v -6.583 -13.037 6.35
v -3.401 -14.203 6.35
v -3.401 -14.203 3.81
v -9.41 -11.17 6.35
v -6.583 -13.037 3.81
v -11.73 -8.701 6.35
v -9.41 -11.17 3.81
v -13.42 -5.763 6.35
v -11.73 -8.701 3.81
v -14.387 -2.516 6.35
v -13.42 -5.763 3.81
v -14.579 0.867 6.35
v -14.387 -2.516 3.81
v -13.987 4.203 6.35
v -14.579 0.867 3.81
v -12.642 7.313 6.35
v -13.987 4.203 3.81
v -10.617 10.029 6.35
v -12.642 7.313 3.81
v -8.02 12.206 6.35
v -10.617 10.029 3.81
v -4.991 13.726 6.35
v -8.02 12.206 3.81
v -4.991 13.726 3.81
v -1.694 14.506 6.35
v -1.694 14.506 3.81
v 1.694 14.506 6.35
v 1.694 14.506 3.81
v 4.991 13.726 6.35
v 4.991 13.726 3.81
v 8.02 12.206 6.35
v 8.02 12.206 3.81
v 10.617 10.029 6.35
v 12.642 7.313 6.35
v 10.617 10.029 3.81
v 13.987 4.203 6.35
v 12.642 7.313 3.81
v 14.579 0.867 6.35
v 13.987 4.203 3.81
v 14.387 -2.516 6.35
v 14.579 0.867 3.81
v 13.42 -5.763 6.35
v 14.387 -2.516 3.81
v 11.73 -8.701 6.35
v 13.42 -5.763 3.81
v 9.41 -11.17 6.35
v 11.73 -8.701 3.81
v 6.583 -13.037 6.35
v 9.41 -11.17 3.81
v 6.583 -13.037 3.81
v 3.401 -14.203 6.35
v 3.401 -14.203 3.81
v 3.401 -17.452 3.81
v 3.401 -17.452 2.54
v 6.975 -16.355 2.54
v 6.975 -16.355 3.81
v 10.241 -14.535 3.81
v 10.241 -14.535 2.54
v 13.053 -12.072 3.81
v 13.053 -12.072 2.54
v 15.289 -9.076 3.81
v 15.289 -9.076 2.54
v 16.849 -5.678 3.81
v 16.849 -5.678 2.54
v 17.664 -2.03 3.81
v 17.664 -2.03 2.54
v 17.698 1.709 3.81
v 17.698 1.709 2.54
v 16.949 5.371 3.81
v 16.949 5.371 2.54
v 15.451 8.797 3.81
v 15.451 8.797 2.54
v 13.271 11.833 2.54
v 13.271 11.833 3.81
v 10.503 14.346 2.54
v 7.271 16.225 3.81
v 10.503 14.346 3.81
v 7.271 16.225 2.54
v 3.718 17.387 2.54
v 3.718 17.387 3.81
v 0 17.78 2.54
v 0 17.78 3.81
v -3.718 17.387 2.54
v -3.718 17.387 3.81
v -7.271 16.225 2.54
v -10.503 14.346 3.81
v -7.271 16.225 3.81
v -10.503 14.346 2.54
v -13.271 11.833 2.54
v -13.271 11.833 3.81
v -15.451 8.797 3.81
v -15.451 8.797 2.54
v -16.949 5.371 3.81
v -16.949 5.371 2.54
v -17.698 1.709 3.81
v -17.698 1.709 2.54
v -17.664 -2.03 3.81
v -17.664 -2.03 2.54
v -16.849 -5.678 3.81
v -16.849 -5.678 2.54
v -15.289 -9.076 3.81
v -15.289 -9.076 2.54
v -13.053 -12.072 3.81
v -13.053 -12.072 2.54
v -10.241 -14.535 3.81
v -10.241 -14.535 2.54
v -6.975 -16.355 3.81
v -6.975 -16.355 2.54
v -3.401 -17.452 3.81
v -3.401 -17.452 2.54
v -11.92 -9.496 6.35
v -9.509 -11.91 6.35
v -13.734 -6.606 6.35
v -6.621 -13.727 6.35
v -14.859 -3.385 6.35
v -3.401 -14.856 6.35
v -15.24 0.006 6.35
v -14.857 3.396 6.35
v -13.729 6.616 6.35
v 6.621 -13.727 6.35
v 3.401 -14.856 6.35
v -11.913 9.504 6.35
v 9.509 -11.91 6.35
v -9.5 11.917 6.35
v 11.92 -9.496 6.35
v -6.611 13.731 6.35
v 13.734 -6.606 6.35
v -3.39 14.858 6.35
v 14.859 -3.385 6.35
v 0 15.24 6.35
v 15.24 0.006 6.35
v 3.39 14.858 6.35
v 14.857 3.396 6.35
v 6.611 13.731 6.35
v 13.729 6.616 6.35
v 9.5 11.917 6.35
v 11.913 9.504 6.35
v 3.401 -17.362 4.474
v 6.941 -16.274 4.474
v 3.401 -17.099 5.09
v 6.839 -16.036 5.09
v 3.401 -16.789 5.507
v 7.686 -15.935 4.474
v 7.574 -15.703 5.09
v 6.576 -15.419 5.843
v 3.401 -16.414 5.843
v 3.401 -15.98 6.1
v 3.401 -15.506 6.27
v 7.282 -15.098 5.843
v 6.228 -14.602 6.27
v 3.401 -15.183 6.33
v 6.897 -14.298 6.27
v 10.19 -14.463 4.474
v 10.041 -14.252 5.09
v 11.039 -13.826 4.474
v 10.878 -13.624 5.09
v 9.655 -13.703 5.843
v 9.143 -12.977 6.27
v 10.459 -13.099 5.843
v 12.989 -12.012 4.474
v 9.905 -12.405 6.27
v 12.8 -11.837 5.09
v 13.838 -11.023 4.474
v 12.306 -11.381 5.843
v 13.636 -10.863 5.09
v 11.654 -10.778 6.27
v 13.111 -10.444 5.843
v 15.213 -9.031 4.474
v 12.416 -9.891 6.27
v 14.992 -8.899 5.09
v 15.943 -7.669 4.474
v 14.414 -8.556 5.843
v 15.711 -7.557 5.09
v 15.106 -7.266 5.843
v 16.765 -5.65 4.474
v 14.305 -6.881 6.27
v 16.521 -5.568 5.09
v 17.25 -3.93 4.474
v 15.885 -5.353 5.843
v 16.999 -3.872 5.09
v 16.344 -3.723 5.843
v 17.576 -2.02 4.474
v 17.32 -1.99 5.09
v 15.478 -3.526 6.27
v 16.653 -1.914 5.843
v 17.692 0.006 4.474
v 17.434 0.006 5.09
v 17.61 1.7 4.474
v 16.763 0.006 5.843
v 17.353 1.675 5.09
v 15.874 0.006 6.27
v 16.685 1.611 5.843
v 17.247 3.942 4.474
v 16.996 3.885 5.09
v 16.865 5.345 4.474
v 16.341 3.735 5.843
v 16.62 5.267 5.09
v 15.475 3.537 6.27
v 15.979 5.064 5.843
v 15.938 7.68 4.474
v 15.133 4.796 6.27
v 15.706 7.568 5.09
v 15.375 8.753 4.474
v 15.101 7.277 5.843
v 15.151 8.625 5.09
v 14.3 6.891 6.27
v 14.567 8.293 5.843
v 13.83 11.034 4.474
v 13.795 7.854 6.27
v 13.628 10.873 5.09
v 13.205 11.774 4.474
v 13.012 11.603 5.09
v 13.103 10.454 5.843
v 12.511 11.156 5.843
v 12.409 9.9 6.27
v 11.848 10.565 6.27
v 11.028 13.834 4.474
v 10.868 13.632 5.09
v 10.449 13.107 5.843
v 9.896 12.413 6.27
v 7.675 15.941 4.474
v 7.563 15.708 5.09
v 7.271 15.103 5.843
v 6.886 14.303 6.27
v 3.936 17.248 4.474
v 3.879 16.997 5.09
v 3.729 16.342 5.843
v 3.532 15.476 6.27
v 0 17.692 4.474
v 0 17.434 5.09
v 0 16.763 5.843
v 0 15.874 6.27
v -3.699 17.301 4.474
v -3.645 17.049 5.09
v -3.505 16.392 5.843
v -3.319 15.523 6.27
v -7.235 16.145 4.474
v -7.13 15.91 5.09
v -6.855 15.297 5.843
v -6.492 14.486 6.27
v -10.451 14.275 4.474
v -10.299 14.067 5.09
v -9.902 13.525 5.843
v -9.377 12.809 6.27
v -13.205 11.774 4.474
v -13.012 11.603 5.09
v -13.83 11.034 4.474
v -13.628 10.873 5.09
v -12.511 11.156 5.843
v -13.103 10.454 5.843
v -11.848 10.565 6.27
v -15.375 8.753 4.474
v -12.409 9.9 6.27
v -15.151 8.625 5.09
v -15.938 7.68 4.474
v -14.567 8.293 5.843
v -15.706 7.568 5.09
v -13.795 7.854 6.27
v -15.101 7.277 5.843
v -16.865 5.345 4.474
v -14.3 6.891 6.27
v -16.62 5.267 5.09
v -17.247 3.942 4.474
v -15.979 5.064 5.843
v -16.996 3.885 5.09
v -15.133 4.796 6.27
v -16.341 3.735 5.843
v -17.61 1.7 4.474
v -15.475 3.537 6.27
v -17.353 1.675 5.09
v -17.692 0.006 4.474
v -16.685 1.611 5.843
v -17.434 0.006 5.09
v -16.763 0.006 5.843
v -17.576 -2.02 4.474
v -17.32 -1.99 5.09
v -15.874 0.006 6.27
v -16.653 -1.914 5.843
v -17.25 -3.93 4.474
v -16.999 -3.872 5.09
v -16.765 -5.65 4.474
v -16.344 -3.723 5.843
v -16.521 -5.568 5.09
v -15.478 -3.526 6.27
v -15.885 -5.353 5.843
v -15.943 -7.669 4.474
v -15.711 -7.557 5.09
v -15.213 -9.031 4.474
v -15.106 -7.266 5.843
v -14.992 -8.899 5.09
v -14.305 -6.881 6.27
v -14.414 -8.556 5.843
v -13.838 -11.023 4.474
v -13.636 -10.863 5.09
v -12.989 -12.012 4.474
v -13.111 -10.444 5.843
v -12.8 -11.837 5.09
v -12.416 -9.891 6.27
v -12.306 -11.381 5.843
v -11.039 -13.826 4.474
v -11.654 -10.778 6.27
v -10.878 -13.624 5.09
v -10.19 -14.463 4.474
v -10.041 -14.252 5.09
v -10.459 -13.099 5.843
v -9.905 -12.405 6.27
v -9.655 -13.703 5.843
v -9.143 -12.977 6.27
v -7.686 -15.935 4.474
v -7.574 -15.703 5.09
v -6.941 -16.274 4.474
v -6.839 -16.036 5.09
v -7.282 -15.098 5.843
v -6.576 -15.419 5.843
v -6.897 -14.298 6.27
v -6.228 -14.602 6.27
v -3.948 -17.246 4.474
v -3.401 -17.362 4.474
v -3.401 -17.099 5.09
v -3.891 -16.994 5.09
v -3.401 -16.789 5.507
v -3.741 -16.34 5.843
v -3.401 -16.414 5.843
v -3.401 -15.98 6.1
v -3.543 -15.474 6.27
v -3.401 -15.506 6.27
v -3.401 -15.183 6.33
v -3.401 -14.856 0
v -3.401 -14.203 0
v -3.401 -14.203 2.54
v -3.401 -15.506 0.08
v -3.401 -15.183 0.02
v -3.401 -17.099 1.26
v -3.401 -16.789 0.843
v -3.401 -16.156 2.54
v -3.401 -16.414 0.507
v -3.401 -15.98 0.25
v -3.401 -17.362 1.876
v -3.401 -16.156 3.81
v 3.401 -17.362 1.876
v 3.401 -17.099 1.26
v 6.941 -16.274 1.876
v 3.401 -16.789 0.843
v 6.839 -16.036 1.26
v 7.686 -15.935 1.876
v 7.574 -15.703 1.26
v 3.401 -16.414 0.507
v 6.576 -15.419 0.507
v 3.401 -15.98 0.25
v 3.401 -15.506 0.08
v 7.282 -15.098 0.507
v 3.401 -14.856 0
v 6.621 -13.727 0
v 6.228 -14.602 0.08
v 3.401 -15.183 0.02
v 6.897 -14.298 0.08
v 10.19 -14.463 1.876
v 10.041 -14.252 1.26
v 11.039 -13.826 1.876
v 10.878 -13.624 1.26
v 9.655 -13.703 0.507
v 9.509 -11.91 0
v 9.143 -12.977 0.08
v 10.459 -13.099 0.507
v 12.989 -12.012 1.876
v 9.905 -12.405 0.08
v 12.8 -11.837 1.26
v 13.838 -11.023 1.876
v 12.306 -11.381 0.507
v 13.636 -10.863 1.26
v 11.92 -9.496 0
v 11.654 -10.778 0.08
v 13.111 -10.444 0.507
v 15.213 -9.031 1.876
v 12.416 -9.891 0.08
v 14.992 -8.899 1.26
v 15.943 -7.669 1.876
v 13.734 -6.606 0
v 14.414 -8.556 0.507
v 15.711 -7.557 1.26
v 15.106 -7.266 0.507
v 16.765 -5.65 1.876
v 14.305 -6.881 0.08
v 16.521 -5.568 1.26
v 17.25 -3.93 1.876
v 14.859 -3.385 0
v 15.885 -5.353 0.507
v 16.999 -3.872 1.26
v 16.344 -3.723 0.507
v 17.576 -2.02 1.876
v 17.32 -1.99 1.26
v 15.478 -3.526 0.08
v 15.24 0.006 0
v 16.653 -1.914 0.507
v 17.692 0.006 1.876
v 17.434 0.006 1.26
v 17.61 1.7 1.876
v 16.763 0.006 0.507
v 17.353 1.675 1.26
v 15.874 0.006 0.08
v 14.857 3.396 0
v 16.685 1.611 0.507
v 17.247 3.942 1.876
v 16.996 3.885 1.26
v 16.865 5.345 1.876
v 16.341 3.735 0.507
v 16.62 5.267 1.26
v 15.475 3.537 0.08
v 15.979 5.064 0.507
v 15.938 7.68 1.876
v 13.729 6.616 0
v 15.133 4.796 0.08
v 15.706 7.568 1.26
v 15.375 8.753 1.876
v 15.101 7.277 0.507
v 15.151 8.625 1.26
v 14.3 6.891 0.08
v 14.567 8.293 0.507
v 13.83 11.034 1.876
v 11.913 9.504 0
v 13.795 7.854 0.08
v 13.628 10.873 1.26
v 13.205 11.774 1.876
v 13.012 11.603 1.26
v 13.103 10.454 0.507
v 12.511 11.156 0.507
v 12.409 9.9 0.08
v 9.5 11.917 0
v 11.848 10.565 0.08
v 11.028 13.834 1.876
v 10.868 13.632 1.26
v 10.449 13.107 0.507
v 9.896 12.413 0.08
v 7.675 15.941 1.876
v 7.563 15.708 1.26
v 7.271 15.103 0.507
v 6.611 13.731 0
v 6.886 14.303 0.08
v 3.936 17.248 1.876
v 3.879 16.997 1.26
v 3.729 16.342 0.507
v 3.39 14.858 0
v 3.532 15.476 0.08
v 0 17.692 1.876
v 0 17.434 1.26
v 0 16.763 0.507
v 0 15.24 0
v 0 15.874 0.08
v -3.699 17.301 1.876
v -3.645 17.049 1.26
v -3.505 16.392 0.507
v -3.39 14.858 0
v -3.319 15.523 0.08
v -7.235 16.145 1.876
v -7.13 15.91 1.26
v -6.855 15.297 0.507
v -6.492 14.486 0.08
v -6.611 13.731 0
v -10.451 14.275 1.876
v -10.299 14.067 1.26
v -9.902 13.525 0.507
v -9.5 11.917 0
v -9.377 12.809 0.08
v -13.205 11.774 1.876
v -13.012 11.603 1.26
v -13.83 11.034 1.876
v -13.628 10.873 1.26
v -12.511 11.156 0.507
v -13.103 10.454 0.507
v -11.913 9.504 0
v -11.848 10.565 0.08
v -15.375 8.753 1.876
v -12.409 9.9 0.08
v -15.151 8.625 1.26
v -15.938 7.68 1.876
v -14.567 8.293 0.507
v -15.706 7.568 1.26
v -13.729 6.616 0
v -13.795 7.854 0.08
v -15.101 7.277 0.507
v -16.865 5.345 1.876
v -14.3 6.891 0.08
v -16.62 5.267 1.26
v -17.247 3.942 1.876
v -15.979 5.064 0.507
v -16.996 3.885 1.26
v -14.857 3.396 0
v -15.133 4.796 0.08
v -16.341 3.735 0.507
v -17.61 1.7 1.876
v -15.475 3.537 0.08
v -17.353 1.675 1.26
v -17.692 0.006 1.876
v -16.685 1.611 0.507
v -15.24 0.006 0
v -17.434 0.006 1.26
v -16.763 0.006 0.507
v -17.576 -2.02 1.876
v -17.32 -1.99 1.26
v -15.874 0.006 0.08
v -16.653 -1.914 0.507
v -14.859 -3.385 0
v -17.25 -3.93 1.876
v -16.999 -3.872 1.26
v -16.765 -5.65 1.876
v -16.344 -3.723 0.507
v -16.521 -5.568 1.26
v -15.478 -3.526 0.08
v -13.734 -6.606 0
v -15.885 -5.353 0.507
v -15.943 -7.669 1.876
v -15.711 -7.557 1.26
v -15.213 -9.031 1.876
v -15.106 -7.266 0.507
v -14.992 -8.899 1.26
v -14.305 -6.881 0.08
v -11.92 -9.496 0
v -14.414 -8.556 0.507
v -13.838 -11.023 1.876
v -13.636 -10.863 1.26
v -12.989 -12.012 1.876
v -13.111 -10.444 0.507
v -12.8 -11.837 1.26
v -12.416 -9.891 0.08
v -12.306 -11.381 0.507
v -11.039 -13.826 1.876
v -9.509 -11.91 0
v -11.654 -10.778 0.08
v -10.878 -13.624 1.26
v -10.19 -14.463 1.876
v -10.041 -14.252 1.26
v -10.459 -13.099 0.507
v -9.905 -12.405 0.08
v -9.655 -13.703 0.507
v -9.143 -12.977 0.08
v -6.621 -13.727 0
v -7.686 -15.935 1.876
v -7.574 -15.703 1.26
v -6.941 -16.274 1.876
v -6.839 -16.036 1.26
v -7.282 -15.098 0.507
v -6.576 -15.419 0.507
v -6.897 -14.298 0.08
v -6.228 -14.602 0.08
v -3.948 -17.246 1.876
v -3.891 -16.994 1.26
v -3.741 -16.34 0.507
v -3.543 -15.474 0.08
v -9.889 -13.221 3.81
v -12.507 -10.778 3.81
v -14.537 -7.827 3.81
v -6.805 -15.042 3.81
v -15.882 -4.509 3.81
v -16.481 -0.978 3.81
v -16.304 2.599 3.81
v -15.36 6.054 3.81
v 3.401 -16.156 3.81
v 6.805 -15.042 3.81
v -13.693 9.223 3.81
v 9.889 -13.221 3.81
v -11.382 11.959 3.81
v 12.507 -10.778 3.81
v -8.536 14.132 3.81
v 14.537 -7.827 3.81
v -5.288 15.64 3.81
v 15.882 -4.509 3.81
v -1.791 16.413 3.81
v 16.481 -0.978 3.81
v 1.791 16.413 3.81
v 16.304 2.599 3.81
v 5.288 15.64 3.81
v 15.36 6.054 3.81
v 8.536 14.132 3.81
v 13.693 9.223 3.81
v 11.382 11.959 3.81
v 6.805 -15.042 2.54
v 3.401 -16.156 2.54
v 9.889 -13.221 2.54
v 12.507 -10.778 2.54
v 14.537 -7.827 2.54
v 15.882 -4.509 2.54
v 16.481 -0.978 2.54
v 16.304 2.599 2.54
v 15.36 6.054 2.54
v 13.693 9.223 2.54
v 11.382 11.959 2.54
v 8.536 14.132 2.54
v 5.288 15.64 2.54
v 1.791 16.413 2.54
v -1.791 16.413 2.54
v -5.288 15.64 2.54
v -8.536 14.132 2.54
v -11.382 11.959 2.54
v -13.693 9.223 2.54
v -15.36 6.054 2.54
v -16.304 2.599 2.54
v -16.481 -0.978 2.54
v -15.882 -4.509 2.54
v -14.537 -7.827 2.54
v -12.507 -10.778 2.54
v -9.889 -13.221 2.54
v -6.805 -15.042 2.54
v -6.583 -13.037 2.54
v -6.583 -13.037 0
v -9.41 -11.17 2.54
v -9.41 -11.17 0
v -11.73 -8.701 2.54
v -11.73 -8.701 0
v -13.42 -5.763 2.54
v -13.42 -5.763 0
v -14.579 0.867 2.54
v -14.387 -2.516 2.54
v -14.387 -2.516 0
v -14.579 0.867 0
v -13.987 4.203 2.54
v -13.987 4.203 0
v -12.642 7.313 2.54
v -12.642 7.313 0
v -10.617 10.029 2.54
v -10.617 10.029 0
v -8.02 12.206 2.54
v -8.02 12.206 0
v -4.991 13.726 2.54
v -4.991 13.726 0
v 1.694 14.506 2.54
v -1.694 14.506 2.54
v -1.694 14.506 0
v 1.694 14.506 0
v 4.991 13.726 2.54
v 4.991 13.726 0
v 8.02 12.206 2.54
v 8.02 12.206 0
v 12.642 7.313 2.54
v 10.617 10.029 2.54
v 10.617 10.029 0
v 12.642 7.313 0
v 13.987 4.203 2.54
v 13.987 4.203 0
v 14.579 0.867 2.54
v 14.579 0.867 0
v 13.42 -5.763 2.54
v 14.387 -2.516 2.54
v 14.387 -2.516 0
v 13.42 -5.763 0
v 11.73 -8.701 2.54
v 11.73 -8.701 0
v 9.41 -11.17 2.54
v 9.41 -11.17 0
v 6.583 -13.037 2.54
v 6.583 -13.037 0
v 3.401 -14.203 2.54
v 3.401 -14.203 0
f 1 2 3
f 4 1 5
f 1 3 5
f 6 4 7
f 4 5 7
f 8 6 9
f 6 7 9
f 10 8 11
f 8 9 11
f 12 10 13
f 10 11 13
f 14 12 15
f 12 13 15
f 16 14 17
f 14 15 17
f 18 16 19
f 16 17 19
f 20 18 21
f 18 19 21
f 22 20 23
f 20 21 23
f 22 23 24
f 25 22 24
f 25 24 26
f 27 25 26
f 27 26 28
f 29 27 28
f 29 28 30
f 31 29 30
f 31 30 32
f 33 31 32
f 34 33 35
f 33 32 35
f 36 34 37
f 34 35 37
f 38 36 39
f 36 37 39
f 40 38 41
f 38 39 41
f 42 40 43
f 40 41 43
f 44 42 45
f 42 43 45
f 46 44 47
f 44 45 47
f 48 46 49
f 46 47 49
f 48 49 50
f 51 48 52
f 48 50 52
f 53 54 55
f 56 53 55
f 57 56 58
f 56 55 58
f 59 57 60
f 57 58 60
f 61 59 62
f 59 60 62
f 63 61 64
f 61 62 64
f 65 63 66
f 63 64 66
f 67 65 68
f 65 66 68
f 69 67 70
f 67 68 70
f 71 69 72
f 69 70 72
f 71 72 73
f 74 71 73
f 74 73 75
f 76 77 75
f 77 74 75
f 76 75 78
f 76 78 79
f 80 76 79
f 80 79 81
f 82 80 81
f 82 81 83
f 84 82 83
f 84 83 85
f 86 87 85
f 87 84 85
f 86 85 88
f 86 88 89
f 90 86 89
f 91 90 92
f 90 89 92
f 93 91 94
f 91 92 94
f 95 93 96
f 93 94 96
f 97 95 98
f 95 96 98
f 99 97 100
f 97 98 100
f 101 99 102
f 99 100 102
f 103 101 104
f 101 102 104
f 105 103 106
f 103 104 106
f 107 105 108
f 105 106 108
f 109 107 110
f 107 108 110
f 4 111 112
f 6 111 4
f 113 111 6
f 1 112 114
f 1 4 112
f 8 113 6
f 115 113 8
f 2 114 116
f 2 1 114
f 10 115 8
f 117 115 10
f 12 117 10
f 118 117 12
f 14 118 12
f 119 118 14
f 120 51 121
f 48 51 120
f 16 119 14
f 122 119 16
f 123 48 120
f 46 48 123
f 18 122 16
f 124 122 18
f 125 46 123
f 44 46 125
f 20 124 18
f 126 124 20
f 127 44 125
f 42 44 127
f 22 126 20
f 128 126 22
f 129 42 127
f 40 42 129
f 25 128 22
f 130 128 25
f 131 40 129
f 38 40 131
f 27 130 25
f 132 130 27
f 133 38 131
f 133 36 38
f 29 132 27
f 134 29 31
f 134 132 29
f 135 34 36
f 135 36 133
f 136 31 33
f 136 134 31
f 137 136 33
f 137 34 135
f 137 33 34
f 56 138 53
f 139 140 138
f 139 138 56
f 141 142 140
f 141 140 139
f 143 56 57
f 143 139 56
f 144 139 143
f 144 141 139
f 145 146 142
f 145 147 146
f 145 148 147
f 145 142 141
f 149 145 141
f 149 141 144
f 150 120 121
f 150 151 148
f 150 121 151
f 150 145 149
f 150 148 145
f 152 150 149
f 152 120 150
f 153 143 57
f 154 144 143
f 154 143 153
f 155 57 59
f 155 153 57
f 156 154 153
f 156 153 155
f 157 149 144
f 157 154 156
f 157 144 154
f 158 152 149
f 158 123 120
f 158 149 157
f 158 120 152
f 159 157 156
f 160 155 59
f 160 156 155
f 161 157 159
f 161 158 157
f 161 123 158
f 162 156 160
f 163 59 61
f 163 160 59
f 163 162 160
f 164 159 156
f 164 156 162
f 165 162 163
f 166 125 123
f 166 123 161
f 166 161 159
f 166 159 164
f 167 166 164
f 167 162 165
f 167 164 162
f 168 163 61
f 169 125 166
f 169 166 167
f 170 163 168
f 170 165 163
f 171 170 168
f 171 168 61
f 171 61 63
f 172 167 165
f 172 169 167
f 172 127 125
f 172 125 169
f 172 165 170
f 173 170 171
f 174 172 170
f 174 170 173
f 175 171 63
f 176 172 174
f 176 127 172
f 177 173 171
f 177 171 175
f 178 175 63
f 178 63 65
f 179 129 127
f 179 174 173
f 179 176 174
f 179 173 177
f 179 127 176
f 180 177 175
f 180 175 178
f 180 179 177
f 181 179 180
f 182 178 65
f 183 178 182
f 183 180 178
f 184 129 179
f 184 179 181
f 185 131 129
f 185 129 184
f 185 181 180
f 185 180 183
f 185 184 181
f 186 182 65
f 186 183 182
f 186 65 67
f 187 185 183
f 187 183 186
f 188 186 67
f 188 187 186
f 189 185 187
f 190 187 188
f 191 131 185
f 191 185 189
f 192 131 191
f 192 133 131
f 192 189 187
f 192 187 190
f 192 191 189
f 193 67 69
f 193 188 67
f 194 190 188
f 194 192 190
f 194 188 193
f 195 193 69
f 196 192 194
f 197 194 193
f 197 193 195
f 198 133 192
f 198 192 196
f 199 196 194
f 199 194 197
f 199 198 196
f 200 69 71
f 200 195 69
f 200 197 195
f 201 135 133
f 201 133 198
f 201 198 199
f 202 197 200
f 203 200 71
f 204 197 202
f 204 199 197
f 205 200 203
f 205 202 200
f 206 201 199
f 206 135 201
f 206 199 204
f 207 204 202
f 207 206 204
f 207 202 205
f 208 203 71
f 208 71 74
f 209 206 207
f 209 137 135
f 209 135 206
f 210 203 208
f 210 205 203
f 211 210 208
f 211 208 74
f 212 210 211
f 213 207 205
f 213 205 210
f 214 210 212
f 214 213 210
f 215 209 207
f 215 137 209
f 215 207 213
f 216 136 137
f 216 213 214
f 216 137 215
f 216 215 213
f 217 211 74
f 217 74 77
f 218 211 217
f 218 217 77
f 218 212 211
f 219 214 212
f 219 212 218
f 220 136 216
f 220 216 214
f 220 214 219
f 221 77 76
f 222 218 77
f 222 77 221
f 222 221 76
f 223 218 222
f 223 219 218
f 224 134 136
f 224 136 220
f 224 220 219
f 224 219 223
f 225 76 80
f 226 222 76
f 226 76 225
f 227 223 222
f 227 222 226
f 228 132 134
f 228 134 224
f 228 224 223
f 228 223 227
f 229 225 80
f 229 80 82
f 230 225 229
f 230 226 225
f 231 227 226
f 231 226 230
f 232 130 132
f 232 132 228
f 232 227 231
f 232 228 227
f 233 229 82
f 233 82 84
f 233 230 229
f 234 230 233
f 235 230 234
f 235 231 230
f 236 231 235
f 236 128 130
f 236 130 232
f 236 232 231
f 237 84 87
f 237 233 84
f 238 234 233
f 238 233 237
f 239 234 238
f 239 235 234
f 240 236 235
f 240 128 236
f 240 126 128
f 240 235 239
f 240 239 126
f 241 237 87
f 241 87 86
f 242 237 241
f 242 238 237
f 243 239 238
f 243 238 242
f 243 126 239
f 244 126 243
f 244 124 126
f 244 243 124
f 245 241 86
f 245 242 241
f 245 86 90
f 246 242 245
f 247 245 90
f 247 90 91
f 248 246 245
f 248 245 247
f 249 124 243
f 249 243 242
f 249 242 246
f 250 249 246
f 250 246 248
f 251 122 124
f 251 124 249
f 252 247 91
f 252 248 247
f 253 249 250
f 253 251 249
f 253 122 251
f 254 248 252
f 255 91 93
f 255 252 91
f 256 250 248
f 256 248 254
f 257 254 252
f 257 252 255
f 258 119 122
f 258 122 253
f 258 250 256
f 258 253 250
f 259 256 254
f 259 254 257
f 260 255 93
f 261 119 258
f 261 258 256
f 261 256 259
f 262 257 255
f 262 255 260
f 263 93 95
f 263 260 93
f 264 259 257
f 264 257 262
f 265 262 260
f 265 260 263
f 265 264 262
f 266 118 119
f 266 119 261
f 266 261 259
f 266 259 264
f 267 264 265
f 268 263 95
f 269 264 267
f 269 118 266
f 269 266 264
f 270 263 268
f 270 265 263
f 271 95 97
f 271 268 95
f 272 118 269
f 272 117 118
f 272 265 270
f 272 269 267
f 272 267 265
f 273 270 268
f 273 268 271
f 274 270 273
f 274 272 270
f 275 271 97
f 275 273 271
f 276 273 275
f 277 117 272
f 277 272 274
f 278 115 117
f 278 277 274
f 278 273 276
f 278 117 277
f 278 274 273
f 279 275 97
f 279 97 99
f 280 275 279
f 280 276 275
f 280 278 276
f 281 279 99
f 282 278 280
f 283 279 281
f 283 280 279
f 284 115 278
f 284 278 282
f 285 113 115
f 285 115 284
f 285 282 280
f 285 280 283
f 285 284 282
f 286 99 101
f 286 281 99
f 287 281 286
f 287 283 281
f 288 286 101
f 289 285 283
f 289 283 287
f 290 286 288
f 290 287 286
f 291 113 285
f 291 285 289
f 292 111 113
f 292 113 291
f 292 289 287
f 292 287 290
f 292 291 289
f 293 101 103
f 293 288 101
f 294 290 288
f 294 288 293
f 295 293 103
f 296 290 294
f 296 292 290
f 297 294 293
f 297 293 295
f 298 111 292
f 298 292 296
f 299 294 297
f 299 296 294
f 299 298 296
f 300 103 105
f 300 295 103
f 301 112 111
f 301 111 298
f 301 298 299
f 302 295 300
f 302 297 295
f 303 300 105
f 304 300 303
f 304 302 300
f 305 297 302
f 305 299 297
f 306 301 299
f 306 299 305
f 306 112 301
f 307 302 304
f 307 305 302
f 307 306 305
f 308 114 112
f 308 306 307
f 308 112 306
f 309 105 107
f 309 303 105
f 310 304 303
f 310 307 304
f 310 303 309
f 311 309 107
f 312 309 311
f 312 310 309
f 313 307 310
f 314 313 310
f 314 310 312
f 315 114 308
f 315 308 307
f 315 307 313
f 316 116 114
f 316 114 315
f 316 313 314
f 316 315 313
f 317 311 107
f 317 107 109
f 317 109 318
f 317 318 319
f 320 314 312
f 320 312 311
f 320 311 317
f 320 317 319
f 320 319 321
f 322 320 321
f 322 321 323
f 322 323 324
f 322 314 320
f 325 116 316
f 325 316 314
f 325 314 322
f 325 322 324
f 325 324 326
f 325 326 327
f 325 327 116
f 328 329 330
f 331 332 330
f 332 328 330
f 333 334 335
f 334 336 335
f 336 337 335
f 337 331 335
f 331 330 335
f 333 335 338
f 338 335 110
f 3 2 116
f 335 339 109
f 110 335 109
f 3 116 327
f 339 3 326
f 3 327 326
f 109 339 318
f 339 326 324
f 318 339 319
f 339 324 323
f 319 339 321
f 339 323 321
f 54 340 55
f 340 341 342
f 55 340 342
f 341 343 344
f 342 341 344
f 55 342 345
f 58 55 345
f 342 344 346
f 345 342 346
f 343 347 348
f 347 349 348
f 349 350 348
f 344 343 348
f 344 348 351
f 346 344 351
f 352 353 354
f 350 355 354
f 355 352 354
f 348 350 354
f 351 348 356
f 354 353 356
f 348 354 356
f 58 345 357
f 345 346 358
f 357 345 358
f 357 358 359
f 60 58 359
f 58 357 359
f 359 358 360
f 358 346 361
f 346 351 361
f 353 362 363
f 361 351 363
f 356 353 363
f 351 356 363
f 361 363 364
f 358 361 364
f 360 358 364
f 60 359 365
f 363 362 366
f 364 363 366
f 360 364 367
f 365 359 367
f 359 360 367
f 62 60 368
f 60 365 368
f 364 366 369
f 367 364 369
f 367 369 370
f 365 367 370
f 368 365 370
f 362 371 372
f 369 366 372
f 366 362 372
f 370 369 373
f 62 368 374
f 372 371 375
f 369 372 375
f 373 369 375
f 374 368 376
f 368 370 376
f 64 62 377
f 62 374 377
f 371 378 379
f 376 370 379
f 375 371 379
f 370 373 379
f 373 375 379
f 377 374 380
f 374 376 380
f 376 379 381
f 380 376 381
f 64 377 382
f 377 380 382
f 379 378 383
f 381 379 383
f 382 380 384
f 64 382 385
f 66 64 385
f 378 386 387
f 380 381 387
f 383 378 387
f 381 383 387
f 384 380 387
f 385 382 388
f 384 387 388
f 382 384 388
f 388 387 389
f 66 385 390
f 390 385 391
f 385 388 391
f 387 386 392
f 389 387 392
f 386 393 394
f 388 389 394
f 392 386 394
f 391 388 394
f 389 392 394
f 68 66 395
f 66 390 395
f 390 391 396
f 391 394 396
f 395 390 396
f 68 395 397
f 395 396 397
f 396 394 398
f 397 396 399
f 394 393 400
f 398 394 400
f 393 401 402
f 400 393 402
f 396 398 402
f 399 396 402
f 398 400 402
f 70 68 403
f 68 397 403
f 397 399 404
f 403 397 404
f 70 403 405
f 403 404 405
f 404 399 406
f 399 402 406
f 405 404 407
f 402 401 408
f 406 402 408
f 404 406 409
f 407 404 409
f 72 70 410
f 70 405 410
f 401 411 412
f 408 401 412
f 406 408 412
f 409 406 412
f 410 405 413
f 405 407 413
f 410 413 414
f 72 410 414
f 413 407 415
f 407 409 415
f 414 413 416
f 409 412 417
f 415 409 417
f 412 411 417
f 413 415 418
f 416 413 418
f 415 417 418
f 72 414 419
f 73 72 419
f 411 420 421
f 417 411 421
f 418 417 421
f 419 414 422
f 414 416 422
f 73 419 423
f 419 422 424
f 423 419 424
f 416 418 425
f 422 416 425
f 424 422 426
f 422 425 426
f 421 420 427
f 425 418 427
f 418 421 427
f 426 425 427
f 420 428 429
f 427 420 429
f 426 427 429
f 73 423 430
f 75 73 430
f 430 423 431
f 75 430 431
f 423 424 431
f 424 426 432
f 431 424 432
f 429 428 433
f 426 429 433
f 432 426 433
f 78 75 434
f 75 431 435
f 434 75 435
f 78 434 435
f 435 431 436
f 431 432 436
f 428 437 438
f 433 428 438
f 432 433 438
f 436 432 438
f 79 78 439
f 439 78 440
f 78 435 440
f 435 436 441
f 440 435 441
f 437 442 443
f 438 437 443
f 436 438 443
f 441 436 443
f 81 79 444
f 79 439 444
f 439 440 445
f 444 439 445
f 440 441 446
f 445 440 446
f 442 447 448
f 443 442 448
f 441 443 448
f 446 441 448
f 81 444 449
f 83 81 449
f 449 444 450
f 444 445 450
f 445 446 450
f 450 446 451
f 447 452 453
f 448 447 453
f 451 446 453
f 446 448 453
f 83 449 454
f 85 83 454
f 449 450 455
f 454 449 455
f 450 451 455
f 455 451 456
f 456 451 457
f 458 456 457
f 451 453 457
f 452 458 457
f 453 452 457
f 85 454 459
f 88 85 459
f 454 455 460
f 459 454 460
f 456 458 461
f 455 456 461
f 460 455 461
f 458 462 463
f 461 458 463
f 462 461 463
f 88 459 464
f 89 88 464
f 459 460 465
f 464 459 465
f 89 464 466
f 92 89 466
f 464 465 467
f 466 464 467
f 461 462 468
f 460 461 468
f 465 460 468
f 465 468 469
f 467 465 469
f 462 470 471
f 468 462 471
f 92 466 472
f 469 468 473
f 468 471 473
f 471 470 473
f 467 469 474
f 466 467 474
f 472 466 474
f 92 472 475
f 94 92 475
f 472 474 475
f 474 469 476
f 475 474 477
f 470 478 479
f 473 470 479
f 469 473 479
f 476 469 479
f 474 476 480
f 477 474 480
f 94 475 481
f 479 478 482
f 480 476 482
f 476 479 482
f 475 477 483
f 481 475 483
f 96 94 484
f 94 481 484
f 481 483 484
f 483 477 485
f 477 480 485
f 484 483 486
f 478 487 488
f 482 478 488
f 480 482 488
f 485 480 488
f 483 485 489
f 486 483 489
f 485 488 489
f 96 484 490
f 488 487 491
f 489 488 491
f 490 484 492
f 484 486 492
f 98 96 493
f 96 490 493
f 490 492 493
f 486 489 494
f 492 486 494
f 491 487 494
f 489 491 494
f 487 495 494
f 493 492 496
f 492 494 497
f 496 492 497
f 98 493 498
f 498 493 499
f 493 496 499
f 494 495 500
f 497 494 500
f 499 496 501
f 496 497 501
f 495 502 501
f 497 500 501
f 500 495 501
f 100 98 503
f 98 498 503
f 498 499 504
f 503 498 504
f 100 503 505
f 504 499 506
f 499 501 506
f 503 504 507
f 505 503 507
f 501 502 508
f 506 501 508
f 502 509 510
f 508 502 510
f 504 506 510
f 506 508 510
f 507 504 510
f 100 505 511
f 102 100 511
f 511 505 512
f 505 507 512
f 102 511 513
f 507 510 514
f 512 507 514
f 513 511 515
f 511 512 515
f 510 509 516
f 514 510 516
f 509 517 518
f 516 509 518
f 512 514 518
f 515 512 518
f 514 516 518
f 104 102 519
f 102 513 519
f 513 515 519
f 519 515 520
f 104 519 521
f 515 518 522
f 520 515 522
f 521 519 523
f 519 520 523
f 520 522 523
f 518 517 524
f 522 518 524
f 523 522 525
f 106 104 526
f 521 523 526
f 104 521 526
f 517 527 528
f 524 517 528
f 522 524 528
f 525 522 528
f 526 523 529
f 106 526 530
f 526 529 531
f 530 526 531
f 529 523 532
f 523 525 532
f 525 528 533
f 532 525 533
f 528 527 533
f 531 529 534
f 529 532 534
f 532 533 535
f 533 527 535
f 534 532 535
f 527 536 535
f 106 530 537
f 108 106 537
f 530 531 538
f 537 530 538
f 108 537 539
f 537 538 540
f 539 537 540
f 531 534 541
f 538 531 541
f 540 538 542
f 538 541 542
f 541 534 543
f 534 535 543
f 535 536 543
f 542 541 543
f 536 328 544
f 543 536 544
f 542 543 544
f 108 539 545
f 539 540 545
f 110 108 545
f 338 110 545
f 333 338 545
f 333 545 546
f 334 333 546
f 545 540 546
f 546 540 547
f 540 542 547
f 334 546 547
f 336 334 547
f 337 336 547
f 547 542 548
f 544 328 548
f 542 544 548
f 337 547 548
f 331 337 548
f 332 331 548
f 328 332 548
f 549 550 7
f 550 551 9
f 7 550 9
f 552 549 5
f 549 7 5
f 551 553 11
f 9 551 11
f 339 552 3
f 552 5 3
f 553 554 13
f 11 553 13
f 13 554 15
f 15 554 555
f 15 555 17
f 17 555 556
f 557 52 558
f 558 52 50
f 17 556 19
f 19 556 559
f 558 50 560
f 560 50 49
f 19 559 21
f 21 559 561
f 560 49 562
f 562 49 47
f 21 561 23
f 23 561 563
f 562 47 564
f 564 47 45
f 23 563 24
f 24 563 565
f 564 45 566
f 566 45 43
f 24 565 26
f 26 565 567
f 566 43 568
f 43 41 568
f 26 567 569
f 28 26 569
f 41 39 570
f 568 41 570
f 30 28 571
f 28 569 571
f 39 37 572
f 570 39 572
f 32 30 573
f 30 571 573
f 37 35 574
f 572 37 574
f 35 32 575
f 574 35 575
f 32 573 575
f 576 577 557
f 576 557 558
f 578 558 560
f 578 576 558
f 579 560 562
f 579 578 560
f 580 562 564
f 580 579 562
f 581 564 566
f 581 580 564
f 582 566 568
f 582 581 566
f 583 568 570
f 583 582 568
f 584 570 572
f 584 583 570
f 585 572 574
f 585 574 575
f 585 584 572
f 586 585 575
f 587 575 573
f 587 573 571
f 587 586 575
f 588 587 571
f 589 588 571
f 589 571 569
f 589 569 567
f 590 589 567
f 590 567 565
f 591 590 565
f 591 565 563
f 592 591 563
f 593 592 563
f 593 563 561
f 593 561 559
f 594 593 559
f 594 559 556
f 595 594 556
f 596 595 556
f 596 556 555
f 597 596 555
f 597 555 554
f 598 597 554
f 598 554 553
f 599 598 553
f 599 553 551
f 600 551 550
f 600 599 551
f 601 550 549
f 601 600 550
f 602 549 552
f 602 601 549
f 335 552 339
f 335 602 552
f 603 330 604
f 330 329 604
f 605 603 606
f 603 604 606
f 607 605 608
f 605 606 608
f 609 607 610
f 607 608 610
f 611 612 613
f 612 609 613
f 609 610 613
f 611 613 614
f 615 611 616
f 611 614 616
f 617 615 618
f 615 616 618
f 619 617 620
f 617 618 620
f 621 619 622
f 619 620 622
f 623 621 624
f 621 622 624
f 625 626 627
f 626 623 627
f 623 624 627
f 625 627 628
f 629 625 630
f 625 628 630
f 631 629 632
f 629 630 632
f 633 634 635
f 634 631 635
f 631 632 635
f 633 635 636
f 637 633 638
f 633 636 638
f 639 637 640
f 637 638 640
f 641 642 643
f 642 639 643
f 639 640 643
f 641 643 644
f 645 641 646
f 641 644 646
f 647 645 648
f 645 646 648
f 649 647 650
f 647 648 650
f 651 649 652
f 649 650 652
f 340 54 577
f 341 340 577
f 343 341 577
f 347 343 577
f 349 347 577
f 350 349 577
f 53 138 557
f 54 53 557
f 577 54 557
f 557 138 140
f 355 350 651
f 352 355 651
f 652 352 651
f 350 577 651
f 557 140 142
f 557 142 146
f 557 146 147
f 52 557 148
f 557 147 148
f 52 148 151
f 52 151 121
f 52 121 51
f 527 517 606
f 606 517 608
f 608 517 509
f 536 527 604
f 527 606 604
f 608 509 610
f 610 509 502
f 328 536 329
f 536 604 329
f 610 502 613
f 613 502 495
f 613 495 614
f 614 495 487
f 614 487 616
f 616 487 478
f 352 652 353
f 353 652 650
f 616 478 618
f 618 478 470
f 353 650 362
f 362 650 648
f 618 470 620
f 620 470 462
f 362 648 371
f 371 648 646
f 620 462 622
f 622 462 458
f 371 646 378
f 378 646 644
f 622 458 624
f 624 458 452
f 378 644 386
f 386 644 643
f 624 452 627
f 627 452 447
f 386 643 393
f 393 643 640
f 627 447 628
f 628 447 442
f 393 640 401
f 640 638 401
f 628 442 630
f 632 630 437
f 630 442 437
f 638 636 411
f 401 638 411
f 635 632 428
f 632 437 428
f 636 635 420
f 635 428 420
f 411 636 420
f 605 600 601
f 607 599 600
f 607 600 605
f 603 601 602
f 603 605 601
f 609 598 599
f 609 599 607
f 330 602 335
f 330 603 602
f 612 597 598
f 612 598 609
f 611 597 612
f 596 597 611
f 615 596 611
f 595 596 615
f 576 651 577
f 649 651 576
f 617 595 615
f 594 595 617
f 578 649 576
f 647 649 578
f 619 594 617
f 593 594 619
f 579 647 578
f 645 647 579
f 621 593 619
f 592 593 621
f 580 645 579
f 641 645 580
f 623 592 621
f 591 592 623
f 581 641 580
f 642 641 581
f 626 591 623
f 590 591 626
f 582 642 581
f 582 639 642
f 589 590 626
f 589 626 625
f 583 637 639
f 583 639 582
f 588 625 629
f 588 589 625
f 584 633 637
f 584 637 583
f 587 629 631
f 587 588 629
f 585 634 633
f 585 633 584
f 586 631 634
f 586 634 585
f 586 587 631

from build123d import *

# Parameters (mm, degrees)
F0_R      = 17.78
F1_DEPTH  = 2.54
F2_R      = 17.78
F2_R_2    = 16.51
F3_DEPTH  = 1.27
F4_R      = 17.78
F5_DEPTH  = 2.54
F6_R      = 14.605
F7_DEPTH  = 50.8
F8_R      = 2.54
F10_DEPTH = 30.734


with BuildPart() as f1:
    # F0 (on Top) → F1 (new body)
    with BuildSketch(Plane.XY):
        Circle(F0_R)
    extrude(amount=F1_DEPTH)

    # F2 (on face) → F3 (join)
    with BuildSketch(Plane.XY.offset(2.54)):
        Circle(F2_R)
        Circle(F2_R_2, mode=Mode.SUBTRACT)
    extrude(amount=F3_DEPTH)

    # F4 (on face) → F5 (join)
    with BuildSketch(Plane.XY.offset(3.81)):
        Circle(F4_R)
    extrude(amount=F5_DEPTH)

    # F6 (on face) → F7 (cut)
    with BuildSketch(Plane(origin=(0, 0, 0), x_dir=(1, 0, 0), z_dir=(0, 0, -1))):
        Circle(F6_R)
    extrude(amount=-F7_DEPTH, mode=Mode.SUBTRACT)

    # F8
    f8_edges = [f1.edges().sort_by_distance(p)[0] for p in [
        (-17.78, 0, 6.35),
        (-17.78, 0, 0),
    ]]
    fillet(f8_edges, radius=F8_R)

    # F9 (on face) → F10 (cut)
    with BuildSketch(Plane.XY.offset(6.35)):
        with BuildLine():
            Line((-3.4012887627, -22.1683233976), (3.4012887627, -22.1683233976))
            Line((3.4012887627, -22.1683233976), (3.4012887627, -14.855599441))
            ThreePointArc((3.4012887627, -14.855599441), (0, -15.24), (-3.4012887627, -14.855599441))
            Line((-3.4012887627, -14.855599441), (-3.4012887627, -22.1683233976))
        make_face()
        with BuildLine():
            ThreePointArc((-3.4012887627, -14.2034242263), (0, -14.605), (3.4012887627, -14.2034242263))
            Line((3.4012887627, -14.2034242263), (3.4012887627, -10.824047029))
            Line((3.4012887627, -10.824047029), (-3.4012887627, -10.824047029))
            Line((-3.4012887627, -10.824047029), (-3.4012887627, -14.2034242263))
        make_face()
        with BuildLine():
            ThreePointArc((-3.4012887627, -14.855599441), (0, -15.24), (3.4012887627, -14.855599441))
            Line((3.4012887627, -14.855599441), (3.4012887627, -14.2034242263))
            ThreePointArc((3.4012887627, -14.2034242263), (0, -14.605), (-3.4012887627, -14.2034242263))
            Line((-3.4012887627, -14.2034242263), (-3.4012887627, -14.855599441))
        make_face()
    extrude(amount=-F10_DEPTH, mode=Mode.SUBTRACT)


solid = f1.part
